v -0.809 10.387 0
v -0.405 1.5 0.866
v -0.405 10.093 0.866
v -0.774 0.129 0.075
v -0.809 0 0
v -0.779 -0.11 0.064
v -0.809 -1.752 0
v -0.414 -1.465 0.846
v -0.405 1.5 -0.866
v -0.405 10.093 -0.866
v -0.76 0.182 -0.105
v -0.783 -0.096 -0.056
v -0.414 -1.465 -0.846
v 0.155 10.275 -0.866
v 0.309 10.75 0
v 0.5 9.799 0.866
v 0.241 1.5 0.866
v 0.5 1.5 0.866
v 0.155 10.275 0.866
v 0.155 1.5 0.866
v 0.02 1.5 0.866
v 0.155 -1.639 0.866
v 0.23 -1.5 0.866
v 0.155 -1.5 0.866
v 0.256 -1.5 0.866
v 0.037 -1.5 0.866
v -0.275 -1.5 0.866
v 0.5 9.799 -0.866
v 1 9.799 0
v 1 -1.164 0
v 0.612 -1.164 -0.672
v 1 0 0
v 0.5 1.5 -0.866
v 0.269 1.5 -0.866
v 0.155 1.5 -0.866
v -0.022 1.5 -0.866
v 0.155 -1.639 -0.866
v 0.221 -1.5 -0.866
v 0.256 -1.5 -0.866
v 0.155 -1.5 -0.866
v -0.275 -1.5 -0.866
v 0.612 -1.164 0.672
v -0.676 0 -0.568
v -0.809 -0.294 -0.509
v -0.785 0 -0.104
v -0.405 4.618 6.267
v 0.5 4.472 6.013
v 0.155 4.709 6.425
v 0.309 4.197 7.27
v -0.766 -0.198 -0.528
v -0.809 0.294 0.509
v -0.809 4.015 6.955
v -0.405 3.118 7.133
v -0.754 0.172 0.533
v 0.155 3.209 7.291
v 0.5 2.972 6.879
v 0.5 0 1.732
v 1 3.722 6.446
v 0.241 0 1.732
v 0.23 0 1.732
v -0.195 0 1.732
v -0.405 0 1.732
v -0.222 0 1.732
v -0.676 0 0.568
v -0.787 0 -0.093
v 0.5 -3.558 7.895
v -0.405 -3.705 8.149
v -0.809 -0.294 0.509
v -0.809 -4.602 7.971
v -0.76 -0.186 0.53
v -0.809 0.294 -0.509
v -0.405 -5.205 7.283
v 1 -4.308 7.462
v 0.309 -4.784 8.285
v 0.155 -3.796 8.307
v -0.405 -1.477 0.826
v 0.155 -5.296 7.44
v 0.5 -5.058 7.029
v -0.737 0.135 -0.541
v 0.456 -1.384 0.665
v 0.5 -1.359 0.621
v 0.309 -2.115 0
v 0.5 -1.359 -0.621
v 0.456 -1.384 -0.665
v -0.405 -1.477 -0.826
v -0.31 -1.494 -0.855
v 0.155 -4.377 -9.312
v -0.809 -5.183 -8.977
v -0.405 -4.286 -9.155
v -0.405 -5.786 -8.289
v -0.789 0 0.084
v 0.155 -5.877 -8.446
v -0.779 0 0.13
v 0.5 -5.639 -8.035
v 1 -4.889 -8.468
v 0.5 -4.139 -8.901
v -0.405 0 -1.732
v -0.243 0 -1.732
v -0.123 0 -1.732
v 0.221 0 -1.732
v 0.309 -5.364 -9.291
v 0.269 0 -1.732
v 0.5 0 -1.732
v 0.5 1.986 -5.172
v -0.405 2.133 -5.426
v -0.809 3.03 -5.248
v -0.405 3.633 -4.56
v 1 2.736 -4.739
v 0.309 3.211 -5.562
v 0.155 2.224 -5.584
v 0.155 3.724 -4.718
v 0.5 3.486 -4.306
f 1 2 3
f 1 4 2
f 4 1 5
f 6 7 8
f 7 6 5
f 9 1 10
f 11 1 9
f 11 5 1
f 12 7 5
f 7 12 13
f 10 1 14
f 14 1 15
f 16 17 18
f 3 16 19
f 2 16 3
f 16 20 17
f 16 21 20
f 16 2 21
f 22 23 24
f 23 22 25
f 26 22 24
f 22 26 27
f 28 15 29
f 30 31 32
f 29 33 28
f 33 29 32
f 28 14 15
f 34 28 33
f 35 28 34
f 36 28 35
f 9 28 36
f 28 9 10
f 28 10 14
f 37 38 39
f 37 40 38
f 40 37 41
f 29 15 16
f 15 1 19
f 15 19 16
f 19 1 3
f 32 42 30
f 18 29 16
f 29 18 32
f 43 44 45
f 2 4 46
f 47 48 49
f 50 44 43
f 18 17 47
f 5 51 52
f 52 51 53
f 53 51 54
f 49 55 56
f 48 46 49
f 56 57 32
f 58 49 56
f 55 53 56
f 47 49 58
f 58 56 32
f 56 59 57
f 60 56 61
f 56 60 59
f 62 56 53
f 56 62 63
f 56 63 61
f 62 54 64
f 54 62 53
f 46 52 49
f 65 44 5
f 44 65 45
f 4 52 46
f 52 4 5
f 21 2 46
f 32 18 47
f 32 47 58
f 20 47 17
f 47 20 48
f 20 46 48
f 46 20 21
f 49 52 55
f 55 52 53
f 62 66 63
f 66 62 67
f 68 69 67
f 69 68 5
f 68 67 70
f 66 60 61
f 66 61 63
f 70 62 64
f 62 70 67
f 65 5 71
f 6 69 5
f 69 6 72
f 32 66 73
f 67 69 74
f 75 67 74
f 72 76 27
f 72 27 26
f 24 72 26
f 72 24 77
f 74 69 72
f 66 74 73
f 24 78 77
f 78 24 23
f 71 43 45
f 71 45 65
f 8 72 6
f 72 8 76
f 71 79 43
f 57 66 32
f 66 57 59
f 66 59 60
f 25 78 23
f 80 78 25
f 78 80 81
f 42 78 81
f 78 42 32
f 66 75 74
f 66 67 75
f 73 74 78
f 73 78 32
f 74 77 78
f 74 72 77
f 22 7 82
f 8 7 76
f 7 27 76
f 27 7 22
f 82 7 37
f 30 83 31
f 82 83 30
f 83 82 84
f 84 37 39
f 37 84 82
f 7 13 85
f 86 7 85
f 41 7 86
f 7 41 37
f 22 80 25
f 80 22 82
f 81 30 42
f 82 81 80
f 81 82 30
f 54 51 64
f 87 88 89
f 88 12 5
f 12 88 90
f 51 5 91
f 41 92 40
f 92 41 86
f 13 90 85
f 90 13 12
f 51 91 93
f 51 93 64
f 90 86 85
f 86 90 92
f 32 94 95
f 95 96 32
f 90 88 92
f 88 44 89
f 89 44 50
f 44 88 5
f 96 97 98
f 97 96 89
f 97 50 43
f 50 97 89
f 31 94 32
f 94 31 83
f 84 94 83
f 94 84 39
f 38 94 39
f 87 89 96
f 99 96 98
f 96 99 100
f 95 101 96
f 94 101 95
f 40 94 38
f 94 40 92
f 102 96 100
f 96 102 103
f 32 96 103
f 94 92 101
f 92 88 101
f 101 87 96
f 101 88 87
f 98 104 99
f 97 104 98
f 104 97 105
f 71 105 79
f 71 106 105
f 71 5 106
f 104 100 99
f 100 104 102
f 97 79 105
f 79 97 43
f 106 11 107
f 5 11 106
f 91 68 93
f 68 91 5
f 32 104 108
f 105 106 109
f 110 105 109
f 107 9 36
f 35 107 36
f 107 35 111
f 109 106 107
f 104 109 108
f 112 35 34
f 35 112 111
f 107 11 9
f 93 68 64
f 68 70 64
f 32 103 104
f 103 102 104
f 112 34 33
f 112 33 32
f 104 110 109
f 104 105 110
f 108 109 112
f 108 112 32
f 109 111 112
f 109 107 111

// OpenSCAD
module estrella(cantidad=6)
{
tsdist = rands(1,10,cantidad);
for ( i = [0 : cantidad-1] )
{
    rotate( i * 360 / cantidad, [1, 0, 0])
    
    hull()
    {
    sphere(r=1);
    translate([0, tsdist[i], 0])
    sphere(r = 1);
    }
}
}
estrella();
